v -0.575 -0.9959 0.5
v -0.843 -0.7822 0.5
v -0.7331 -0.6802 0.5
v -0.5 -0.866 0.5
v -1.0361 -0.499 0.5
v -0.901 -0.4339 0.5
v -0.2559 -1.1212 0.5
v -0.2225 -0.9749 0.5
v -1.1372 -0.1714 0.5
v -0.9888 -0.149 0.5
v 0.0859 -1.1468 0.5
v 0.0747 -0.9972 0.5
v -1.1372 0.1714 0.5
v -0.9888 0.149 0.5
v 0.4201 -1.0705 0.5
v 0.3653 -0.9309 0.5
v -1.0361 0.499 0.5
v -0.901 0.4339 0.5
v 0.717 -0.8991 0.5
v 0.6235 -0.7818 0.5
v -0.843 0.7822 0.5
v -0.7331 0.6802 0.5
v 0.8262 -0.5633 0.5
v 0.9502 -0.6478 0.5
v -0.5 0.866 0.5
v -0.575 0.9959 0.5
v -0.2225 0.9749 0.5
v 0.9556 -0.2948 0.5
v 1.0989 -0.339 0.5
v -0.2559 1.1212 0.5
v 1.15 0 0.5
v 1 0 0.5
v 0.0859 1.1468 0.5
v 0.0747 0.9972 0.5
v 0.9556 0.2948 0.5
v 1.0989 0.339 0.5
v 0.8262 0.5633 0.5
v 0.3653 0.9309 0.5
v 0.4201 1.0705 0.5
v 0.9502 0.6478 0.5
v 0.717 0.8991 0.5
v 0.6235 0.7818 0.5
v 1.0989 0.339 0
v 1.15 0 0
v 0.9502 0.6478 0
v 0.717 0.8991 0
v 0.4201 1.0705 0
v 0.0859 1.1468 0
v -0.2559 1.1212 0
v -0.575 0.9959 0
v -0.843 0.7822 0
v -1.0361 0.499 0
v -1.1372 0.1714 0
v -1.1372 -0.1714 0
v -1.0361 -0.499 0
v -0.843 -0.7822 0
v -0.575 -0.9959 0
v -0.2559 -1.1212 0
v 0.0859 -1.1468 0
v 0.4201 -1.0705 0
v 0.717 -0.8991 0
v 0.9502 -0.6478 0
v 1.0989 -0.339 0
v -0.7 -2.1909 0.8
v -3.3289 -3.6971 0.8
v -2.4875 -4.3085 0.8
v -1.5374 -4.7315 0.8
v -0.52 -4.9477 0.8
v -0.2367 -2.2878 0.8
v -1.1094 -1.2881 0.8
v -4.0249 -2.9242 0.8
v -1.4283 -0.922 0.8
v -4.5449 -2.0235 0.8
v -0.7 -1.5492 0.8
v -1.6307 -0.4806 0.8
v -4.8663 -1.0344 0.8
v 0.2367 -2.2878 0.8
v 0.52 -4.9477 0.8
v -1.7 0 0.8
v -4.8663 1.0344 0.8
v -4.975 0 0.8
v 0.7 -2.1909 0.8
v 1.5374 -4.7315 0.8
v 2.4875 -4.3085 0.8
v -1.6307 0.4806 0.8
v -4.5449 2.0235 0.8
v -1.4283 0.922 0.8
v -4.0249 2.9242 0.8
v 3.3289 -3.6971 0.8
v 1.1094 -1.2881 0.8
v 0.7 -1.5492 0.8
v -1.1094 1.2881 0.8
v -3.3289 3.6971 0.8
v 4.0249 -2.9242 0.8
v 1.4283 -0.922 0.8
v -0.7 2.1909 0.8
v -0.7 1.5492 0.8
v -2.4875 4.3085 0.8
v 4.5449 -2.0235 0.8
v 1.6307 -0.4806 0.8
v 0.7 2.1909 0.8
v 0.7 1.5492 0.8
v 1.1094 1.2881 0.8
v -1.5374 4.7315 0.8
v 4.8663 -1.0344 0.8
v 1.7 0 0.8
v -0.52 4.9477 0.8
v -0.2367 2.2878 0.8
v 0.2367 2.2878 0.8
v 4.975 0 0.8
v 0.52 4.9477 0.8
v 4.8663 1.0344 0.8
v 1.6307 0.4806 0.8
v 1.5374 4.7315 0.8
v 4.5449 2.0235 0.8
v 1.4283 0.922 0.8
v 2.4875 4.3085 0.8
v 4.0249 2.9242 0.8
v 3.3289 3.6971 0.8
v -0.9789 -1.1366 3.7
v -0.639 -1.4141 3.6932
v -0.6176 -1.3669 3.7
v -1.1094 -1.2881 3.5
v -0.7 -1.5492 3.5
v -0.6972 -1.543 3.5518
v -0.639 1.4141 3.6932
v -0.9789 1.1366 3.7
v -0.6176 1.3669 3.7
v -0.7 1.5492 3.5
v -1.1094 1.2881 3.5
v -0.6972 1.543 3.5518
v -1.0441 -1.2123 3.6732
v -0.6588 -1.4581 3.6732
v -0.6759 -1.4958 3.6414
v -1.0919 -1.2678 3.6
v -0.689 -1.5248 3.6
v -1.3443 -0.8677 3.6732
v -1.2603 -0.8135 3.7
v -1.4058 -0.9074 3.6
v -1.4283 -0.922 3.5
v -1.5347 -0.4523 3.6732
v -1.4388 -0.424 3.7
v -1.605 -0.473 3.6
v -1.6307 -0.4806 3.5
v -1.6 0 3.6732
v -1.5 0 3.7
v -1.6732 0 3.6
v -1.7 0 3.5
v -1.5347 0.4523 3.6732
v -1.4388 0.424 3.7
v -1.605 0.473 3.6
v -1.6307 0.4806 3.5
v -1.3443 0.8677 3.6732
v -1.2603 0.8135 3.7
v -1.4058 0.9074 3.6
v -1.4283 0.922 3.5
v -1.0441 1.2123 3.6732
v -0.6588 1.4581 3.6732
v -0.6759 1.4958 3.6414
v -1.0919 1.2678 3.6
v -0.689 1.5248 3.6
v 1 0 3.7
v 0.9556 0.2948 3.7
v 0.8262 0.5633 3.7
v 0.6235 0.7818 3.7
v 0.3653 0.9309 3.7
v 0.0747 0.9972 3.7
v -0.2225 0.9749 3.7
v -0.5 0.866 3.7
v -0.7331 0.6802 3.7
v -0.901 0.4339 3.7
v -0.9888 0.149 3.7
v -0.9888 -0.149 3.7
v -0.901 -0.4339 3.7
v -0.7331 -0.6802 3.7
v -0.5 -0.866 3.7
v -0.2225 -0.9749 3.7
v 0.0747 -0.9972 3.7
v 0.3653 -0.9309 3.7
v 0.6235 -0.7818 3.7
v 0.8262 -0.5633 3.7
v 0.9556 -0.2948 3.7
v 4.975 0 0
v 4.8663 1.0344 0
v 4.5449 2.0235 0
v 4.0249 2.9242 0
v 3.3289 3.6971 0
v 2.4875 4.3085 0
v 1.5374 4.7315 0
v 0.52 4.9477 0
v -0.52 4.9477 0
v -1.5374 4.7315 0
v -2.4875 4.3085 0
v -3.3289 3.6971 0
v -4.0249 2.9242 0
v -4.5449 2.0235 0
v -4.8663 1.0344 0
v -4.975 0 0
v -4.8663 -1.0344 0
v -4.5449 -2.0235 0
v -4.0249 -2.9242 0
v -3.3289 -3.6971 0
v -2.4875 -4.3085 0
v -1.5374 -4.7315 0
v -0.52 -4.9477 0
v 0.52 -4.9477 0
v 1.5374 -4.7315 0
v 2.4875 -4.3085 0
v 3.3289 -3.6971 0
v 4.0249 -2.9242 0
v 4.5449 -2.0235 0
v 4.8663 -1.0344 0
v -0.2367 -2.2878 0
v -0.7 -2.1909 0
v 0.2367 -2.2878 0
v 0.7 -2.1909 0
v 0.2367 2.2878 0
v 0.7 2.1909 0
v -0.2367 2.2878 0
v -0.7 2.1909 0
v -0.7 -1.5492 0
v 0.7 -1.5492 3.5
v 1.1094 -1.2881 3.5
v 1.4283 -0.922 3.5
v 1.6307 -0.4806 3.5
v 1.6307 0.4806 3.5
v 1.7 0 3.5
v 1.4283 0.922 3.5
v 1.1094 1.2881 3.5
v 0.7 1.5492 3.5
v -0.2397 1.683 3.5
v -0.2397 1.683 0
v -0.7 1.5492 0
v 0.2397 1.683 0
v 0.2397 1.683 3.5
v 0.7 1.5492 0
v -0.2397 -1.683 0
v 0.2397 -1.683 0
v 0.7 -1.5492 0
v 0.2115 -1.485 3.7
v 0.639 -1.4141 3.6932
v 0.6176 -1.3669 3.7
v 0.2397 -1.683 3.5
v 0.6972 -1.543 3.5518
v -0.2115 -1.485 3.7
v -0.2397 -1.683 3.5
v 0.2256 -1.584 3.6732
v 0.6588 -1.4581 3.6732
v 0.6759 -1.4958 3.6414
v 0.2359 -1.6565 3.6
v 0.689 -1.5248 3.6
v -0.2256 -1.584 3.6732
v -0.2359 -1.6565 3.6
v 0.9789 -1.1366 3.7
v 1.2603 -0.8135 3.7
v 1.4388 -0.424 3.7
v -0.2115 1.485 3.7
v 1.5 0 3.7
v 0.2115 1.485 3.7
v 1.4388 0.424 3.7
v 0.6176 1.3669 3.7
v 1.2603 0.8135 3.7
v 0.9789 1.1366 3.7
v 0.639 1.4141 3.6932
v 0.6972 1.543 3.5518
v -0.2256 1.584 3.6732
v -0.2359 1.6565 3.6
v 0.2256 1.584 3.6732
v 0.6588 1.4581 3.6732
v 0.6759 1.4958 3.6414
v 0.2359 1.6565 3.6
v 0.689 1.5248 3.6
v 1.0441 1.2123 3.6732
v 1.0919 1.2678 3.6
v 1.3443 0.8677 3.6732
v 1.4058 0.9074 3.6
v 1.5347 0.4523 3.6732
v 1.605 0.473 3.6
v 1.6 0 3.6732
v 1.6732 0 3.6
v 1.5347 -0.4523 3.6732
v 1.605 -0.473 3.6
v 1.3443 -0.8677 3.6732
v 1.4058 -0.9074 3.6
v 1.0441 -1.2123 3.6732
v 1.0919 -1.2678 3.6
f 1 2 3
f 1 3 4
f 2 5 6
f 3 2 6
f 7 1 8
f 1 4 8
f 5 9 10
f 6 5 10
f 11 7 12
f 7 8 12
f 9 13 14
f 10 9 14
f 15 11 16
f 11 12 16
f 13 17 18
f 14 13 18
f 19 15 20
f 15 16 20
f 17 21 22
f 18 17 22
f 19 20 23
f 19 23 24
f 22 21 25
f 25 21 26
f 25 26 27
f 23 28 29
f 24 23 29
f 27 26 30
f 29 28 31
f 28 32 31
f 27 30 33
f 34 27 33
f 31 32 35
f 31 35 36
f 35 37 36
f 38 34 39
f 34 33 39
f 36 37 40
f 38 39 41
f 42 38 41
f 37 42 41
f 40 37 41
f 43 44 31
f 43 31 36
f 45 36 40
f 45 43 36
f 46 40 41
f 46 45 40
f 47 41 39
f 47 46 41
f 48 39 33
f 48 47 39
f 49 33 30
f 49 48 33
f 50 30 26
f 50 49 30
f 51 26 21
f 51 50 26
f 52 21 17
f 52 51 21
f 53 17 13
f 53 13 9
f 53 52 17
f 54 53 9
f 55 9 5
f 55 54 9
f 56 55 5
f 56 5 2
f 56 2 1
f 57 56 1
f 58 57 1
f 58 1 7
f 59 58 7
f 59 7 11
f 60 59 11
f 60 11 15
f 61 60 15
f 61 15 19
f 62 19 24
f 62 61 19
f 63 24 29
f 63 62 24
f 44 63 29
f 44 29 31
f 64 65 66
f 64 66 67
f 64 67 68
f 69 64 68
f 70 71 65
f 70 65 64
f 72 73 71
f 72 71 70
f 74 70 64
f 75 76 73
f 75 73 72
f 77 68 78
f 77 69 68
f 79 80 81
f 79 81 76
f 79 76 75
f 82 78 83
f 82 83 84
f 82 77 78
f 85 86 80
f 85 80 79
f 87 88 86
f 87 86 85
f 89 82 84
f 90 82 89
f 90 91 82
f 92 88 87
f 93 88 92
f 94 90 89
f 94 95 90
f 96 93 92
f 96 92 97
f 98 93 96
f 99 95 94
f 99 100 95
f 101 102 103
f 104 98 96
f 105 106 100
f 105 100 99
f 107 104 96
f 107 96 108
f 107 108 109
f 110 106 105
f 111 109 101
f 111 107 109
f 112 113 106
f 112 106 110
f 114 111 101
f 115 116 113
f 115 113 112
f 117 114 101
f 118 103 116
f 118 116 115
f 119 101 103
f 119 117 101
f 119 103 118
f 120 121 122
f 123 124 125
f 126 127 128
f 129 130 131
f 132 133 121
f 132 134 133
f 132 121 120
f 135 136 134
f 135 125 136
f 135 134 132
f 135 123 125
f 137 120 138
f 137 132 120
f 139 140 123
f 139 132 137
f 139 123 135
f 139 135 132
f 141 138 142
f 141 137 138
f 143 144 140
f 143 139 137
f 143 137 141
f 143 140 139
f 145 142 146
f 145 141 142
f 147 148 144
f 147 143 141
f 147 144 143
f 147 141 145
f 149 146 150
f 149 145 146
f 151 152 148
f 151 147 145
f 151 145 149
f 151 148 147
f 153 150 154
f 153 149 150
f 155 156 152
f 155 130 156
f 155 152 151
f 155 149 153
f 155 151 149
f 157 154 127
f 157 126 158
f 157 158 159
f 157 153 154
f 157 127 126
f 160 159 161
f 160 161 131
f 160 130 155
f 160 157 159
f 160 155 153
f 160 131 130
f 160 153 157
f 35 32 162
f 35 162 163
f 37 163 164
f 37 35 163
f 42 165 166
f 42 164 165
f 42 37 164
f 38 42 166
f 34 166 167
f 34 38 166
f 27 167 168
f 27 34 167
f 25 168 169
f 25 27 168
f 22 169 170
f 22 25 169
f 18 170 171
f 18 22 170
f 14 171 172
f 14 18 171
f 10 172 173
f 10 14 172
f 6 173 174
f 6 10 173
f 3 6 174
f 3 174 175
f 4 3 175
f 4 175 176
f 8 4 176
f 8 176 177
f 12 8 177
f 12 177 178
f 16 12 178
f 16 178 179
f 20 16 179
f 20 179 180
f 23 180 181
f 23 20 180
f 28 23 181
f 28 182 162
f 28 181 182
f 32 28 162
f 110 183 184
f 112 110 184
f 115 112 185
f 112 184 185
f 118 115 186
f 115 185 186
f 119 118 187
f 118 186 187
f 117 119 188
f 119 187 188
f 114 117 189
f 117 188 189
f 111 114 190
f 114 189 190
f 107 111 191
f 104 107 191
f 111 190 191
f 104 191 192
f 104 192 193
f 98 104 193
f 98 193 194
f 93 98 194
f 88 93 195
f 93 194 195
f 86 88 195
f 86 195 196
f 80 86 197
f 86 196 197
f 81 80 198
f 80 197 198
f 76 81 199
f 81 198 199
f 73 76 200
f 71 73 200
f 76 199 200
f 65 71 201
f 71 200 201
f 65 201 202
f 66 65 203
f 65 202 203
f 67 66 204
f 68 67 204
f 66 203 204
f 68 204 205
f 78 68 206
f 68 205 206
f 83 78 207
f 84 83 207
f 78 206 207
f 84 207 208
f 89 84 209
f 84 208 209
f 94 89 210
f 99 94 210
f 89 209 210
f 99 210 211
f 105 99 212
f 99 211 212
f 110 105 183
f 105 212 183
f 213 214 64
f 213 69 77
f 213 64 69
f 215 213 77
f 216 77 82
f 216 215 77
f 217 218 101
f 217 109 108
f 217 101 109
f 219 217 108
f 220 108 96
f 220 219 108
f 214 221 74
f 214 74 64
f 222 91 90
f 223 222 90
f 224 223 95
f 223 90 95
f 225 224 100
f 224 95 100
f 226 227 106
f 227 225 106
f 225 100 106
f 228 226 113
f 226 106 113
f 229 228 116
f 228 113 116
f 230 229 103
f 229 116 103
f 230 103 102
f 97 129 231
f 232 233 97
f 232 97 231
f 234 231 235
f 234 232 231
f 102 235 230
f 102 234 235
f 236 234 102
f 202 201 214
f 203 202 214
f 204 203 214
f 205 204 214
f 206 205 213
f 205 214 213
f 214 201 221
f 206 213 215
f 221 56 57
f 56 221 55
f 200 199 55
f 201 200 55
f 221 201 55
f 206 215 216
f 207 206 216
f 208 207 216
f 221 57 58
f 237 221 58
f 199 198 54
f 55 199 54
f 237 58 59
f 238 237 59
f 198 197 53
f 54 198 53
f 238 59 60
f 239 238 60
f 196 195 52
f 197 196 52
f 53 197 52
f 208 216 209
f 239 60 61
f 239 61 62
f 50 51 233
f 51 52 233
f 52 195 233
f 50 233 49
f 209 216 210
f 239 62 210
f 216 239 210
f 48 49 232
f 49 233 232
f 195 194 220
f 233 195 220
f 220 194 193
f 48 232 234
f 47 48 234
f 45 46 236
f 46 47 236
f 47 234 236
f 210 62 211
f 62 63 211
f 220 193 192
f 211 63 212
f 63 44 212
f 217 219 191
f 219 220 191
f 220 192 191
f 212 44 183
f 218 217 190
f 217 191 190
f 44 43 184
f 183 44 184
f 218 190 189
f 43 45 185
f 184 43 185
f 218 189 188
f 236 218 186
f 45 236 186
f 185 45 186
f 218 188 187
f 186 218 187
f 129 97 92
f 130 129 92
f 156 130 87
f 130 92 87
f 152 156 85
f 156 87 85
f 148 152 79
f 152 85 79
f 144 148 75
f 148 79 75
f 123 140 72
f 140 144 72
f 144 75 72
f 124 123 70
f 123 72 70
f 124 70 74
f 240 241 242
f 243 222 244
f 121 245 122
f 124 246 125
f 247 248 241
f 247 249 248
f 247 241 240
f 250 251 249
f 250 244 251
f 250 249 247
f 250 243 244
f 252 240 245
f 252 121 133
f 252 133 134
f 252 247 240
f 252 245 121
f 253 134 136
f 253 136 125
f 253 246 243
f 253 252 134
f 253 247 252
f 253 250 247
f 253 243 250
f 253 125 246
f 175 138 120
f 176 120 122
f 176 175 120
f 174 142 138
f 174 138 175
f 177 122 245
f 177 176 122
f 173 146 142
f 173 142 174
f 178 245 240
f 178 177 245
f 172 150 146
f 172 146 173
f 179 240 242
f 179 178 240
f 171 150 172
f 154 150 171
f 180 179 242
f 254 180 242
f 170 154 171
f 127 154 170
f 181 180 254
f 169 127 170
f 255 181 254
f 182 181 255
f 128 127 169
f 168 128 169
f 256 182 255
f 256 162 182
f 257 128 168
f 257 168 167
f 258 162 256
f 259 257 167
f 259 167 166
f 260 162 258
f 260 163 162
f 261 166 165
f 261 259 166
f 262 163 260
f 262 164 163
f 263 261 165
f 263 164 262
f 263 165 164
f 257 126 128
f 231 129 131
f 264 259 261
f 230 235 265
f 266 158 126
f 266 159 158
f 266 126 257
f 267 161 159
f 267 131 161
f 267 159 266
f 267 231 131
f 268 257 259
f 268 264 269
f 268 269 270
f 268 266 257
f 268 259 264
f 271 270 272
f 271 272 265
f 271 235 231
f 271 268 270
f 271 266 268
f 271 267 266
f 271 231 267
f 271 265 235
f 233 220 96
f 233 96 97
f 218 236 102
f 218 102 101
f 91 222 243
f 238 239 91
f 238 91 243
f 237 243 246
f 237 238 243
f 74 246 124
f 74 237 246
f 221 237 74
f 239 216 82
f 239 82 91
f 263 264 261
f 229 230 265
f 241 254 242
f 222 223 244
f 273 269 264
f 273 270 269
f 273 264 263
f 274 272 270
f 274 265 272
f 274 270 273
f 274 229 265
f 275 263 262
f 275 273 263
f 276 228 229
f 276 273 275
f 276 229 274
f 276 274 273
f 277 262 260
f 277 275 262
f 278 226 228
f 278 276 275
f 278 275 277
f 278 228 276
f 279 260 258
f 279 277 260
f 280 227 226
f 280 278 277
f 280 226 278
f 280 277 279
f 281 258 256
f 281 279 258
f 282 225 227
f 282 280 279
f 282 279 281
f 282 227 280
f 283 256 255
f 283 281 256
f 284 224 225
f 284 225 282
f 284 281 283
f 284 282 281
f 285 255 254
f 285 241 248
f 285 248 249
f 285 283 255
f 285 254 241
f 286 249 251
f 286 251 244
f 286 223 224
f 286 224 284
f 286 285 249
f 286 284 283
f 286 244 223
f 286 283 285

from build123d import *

# Parameters (mm, degrees)
SKETCH_1_R          = 4.975
EXTRUDE_1_DEPTH     = 0.8
SKETCH_1_6_R        = 1.7
EXTRUDE_2_DEPTH     = 3.7
SKETCH_1_4_R        = 1.15
CUT_EXTRUDE_1_DEPTH = 0.5
SKETCH_1_7_R        = 1
CUT_EXTRUDE_2_DEPTH = 4.7
FILLET_1_R          = 0.2


with BuildPart() as part:
    # Sketch 1 → Extrude 1 (new body)
    with BuildSketch(Plane.XY):
        Circle(SKETCH_1_R)
    extrude(amount=EXTRUDE_1_DEPTH)

    # Sketch 1_6 → Extrude 2 (add)
    with BuildSketch(Plane.XY):
        Circle(SKETCH_1_6_R)
    extrude(amount=EXTRUDE_2_DEPTH)

    # Sketch 1_4 → Cut-Extrude 1 (cut)
    with BuildSketch(Plane.XY):
        Circle(SKETCH_1_4_R)
    extrude(amount=CUT_EXTRUDE_1_DEPTH, mode=Mode.SUBTRACT)

    # Sketch 1_7 → Cut-Extrude 2 (cut, through all)
    with BuildSketch(Plane.XY):
        with BuildLine():
            Line((-0.7, -1.549193338), (-0.7, -2.19089023))
            ThreePointArc((-0.7, -2.19089023), (0, -2.3), (0.7, -2.19089023))
            Line((0.7, -2.19089023), (0.7, -1.549193338))
            ThreePointArc((0.7, -1.549193338), (0, -1.7), (-0.7, -1.549193338))
        make_face()
        with BuildLine():
            ThreePointArc((0.7, 2.19089023), (0, 2.3), (-0.7, 2.19089023))
            Line((-0.7, 2.19089023), (-0.7, 1.549193338))
            ThreePointArc((-0.7, 1.549193338), (0, 1.7), (0.7, 1.549193338))
            Line((0.7, 1.549193338), (0.7, 2.19089023))
        make_face()
        with BuildLine():
            Line((-0.7, -1.549193338), (-0.7, -2.19089023))
            ThreePointArc((-0.7, -2.19089023), (0, -2.3), (0.7, -2.19089023))
            Line((0.7, -2.19089023), (0.7, -1.549193338))
            ThreePointArc((0.7, -1.549193338), (0, -1.7), (-0.7, -1.549193338))
        make_face()
        with BuildLine():
            ThreePointArc((0.7, 2.19089023), (0, 2.3), (-0.7, 2.19089023))
            Line((-0.7, 2.19089023), (-0.7, 1.549193338))
            ThreePointArc((-0.7, 1.549193338), (0, 1.7), (0.7, 1.549193338))
            Line((0.7, 1.549193338), (0.7, 2.19089023))
        make_face()
        Circle(SKETCH_1_7_R)
    extrude(amount=CUT_EXTRUDE_2_DEPTH, mode=Mode.SUBTRACT)

    # Fillet 1
    fillet_1_edges = [part.edges().sort_by_distance(p)[0] for p in [
        (1.428285686, 0.921954446, 3.7),
    ]]
    fillet(fillet_1_edges, radius=FILLET_1_R)


solid = part.part
